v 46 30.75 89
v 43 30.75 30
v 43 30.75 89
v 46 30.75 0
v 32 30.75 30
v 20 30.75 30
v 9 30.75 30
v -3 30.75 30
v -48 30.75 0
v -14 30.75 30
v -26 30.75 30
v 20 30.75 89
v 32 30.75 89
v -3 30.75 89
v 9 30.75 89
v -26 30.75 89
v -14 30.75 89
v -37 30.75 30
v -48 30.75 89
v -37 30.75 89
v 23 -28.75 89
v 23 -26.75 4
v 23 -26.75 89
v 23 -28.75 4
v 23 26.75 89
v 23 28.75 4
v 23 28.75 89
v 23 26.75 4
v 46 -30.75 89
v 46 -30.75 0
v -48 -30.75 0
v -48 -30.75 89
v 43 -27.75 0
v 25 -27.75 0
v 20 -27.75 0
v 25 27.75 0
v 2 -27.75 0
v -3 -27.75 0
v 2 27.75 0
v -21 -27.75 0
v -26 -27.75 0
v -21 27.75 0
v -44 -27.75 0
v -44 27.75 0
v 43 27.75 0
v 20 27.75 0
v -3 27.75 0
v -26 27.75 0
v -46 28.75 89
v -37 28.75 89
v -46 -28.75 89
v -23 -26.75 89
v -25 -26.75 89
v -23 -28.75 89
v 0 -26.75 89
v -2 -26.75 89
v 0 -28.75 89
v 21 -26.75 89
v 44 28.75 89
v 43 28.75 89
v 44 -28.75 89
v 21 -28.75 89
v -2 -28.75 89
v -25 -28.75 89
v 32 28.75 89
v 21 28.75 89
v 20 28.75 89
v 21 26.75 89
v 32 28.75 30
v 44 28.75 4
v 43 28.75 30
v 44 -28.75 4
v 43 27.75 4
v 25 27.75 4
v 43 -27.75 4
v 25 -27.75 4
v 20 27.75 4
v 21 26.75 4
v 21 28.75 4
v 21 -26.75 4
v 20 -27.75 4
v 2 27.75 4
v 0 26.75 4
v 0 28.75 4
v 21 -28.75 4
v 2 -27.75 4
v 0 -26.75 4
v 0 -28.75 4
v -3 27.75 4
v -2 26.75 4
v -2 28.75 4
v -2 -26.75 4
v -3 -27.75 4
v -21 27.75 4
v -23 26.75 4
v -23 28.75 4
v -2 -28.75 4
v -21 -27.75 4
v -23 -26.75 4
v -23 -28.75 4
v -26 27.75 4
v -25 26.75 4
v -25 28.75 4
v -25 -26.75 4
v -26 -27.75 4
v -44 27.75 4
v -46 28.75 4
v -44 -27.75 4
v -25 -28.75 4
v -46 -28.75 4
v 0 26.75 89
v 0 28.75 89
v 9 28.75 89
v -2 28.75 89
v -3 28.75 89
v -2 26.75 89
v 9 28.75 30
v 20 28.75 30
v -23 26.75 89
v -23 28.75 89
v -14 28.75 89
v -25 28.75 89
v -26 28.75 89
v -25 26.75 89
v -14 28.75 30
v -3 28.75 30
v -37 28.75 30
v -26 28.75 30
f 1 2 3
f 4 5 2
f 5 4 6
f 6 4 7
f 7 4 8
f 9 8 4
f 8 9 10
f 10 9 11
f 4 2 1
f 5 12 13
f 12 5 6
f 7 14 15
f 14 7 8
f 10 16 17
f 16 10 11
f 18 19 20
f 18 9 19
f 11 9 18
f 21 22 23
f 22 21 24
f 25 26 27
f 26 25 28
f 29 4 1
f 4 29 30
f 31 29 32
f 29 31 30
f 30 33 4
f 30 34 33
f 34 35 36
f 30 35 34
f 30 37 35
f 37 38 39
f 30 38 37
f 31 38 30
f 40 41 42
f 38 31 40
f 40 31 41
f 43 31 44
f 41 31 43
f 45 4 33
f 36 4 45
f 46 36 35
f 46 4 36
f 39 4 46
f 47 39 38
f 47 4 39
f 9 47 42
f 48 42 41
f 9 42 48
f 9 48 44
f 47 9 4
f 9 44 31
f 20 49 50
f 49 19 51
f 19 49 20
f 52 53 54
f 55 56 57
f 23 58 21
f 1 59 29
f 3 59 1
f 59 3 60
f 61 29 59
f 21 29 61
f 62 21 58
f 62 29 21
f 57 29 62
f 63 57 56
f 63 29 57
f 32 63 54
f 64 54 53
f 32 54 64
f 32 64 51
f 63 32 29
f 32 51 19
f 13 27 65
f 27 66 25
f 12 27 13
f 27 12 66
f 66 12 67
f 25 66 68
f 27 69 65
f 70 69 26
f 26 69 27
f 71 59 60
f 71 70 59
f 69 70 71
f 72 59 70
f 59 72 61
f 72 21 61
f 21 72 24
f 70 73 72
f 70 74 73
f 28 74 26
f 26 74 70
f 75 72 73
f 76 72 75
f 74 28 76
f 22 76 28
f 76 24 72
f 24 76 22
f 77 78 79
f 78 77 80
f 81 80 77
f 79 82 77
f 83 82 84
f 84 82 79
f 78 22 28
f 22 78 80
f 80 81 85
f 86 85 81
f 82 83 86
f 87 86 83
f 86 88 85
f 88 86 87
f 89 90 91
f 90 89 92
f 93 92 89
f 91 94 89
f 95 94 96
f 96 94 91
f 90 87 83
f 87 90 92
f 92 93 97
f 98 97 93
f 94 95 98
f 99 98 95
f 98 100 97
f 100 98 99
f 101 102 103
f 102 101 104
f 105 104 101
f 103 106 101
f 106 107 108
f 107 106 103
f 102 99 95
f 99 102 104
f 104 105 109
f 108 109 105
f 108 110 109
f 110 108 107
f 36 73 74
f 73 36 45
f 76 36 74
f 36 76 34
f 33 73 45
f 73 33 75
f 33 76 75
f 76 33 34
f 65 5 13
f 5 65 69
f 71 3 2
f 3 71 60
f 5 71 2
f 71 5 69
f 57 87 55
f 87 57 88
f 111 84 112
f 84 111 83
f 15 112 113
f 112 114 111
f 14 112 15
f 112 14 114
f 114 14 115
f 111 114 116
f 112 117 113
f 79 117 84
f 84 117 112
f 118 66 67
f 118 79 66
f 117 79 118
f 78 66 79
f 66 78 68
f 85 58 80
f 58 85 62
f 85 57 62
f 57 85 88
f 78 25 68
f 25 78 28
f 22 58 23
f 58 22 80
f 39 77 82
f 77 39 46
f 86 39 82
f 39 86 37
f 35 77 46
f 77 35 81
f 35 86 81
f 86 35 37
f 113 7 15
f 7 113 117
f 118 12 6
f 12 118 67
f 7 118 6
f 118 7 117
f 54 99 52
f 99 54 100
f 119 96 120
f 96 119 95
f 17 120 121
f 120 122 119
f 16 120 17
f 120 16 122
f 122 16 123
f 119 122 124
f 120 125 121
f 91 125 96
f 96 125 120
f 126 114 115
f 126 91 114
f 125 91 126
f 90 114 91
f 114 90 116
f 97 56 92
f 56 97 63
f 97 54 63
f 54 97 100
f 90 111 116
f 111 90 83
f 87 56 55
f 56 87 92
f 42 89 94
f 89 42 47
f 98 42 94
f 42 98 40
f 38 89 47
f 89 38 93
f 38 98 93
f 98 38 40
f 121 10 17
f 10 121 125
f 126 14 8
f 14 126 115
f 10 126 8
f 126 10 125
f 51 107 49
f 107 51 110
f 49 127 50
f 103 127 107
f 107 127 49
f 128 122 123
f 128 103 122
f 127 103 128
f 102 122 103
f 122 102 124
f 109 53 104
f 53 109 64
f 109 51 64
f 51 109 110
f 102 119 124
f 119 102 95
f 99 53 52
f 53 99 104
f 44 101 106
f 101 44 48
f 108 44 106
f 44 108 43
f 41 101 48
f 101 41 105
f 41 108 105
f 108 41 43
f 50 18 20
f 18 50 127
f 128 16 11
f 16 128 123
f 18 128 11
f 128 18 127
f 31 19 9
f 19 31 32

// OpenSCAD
// preview[view:east, tilt:top]
// vim:ts=4:sw=4:sts=4:et:ai

/* [Global] */
//how many raspis to stack on each other
rack_height=4; //[1:10]


/* [Hidden] */
rpi_width=57.5;
rpi_length=87;
u_height=23;
wall=2;
ledge=2;
port_height=11;
port_len=61;

module rack_floor() {
    cube([rpi_width+2*wall,rpi_length+wall,wall]);
}

module one_u() {
    difference() {
        cube([rpi_width+2*wall,rpi_length+wall,u_height]);
        // cut out main area
        translate([wall,-wall,wall]) {
            cube([rpi_width,rpi_length,u_height]);
        }
        //cut floor
        translate([wall+ledge,-wall,-wall]) {
            cube([rpi_width-2*ledge,rpi_length,3*wall]);
        }

        //back
        translate([wall+1,rpi_length-2*wall,ledge+1]) {
            cube([rpi_width-2,5*wall,u_height-1-2*wall]);
        }
        //side ports
        translate([rpi_width,-wall,wall+1]) {
            cube([5*wall,port_len,port_height]);
        }
    }
}

module raspi_rack() {
	rack_floor();
	for(i=[1:rack_height]) {
		translate([0,0,(i-1)*u_height]) {
            one_u();
        }
	}
	//roof
	translate([0,0,rack_height*u_height]) {
        rack_floor();
    }
}

//rotate & center
translate([(rack_height*u_height)/2,-(rpi_width+2*wall)/2,rpi_length+wall]) {
    rotate([-90,0,90]) {
        raspi_rack();
    }
}
